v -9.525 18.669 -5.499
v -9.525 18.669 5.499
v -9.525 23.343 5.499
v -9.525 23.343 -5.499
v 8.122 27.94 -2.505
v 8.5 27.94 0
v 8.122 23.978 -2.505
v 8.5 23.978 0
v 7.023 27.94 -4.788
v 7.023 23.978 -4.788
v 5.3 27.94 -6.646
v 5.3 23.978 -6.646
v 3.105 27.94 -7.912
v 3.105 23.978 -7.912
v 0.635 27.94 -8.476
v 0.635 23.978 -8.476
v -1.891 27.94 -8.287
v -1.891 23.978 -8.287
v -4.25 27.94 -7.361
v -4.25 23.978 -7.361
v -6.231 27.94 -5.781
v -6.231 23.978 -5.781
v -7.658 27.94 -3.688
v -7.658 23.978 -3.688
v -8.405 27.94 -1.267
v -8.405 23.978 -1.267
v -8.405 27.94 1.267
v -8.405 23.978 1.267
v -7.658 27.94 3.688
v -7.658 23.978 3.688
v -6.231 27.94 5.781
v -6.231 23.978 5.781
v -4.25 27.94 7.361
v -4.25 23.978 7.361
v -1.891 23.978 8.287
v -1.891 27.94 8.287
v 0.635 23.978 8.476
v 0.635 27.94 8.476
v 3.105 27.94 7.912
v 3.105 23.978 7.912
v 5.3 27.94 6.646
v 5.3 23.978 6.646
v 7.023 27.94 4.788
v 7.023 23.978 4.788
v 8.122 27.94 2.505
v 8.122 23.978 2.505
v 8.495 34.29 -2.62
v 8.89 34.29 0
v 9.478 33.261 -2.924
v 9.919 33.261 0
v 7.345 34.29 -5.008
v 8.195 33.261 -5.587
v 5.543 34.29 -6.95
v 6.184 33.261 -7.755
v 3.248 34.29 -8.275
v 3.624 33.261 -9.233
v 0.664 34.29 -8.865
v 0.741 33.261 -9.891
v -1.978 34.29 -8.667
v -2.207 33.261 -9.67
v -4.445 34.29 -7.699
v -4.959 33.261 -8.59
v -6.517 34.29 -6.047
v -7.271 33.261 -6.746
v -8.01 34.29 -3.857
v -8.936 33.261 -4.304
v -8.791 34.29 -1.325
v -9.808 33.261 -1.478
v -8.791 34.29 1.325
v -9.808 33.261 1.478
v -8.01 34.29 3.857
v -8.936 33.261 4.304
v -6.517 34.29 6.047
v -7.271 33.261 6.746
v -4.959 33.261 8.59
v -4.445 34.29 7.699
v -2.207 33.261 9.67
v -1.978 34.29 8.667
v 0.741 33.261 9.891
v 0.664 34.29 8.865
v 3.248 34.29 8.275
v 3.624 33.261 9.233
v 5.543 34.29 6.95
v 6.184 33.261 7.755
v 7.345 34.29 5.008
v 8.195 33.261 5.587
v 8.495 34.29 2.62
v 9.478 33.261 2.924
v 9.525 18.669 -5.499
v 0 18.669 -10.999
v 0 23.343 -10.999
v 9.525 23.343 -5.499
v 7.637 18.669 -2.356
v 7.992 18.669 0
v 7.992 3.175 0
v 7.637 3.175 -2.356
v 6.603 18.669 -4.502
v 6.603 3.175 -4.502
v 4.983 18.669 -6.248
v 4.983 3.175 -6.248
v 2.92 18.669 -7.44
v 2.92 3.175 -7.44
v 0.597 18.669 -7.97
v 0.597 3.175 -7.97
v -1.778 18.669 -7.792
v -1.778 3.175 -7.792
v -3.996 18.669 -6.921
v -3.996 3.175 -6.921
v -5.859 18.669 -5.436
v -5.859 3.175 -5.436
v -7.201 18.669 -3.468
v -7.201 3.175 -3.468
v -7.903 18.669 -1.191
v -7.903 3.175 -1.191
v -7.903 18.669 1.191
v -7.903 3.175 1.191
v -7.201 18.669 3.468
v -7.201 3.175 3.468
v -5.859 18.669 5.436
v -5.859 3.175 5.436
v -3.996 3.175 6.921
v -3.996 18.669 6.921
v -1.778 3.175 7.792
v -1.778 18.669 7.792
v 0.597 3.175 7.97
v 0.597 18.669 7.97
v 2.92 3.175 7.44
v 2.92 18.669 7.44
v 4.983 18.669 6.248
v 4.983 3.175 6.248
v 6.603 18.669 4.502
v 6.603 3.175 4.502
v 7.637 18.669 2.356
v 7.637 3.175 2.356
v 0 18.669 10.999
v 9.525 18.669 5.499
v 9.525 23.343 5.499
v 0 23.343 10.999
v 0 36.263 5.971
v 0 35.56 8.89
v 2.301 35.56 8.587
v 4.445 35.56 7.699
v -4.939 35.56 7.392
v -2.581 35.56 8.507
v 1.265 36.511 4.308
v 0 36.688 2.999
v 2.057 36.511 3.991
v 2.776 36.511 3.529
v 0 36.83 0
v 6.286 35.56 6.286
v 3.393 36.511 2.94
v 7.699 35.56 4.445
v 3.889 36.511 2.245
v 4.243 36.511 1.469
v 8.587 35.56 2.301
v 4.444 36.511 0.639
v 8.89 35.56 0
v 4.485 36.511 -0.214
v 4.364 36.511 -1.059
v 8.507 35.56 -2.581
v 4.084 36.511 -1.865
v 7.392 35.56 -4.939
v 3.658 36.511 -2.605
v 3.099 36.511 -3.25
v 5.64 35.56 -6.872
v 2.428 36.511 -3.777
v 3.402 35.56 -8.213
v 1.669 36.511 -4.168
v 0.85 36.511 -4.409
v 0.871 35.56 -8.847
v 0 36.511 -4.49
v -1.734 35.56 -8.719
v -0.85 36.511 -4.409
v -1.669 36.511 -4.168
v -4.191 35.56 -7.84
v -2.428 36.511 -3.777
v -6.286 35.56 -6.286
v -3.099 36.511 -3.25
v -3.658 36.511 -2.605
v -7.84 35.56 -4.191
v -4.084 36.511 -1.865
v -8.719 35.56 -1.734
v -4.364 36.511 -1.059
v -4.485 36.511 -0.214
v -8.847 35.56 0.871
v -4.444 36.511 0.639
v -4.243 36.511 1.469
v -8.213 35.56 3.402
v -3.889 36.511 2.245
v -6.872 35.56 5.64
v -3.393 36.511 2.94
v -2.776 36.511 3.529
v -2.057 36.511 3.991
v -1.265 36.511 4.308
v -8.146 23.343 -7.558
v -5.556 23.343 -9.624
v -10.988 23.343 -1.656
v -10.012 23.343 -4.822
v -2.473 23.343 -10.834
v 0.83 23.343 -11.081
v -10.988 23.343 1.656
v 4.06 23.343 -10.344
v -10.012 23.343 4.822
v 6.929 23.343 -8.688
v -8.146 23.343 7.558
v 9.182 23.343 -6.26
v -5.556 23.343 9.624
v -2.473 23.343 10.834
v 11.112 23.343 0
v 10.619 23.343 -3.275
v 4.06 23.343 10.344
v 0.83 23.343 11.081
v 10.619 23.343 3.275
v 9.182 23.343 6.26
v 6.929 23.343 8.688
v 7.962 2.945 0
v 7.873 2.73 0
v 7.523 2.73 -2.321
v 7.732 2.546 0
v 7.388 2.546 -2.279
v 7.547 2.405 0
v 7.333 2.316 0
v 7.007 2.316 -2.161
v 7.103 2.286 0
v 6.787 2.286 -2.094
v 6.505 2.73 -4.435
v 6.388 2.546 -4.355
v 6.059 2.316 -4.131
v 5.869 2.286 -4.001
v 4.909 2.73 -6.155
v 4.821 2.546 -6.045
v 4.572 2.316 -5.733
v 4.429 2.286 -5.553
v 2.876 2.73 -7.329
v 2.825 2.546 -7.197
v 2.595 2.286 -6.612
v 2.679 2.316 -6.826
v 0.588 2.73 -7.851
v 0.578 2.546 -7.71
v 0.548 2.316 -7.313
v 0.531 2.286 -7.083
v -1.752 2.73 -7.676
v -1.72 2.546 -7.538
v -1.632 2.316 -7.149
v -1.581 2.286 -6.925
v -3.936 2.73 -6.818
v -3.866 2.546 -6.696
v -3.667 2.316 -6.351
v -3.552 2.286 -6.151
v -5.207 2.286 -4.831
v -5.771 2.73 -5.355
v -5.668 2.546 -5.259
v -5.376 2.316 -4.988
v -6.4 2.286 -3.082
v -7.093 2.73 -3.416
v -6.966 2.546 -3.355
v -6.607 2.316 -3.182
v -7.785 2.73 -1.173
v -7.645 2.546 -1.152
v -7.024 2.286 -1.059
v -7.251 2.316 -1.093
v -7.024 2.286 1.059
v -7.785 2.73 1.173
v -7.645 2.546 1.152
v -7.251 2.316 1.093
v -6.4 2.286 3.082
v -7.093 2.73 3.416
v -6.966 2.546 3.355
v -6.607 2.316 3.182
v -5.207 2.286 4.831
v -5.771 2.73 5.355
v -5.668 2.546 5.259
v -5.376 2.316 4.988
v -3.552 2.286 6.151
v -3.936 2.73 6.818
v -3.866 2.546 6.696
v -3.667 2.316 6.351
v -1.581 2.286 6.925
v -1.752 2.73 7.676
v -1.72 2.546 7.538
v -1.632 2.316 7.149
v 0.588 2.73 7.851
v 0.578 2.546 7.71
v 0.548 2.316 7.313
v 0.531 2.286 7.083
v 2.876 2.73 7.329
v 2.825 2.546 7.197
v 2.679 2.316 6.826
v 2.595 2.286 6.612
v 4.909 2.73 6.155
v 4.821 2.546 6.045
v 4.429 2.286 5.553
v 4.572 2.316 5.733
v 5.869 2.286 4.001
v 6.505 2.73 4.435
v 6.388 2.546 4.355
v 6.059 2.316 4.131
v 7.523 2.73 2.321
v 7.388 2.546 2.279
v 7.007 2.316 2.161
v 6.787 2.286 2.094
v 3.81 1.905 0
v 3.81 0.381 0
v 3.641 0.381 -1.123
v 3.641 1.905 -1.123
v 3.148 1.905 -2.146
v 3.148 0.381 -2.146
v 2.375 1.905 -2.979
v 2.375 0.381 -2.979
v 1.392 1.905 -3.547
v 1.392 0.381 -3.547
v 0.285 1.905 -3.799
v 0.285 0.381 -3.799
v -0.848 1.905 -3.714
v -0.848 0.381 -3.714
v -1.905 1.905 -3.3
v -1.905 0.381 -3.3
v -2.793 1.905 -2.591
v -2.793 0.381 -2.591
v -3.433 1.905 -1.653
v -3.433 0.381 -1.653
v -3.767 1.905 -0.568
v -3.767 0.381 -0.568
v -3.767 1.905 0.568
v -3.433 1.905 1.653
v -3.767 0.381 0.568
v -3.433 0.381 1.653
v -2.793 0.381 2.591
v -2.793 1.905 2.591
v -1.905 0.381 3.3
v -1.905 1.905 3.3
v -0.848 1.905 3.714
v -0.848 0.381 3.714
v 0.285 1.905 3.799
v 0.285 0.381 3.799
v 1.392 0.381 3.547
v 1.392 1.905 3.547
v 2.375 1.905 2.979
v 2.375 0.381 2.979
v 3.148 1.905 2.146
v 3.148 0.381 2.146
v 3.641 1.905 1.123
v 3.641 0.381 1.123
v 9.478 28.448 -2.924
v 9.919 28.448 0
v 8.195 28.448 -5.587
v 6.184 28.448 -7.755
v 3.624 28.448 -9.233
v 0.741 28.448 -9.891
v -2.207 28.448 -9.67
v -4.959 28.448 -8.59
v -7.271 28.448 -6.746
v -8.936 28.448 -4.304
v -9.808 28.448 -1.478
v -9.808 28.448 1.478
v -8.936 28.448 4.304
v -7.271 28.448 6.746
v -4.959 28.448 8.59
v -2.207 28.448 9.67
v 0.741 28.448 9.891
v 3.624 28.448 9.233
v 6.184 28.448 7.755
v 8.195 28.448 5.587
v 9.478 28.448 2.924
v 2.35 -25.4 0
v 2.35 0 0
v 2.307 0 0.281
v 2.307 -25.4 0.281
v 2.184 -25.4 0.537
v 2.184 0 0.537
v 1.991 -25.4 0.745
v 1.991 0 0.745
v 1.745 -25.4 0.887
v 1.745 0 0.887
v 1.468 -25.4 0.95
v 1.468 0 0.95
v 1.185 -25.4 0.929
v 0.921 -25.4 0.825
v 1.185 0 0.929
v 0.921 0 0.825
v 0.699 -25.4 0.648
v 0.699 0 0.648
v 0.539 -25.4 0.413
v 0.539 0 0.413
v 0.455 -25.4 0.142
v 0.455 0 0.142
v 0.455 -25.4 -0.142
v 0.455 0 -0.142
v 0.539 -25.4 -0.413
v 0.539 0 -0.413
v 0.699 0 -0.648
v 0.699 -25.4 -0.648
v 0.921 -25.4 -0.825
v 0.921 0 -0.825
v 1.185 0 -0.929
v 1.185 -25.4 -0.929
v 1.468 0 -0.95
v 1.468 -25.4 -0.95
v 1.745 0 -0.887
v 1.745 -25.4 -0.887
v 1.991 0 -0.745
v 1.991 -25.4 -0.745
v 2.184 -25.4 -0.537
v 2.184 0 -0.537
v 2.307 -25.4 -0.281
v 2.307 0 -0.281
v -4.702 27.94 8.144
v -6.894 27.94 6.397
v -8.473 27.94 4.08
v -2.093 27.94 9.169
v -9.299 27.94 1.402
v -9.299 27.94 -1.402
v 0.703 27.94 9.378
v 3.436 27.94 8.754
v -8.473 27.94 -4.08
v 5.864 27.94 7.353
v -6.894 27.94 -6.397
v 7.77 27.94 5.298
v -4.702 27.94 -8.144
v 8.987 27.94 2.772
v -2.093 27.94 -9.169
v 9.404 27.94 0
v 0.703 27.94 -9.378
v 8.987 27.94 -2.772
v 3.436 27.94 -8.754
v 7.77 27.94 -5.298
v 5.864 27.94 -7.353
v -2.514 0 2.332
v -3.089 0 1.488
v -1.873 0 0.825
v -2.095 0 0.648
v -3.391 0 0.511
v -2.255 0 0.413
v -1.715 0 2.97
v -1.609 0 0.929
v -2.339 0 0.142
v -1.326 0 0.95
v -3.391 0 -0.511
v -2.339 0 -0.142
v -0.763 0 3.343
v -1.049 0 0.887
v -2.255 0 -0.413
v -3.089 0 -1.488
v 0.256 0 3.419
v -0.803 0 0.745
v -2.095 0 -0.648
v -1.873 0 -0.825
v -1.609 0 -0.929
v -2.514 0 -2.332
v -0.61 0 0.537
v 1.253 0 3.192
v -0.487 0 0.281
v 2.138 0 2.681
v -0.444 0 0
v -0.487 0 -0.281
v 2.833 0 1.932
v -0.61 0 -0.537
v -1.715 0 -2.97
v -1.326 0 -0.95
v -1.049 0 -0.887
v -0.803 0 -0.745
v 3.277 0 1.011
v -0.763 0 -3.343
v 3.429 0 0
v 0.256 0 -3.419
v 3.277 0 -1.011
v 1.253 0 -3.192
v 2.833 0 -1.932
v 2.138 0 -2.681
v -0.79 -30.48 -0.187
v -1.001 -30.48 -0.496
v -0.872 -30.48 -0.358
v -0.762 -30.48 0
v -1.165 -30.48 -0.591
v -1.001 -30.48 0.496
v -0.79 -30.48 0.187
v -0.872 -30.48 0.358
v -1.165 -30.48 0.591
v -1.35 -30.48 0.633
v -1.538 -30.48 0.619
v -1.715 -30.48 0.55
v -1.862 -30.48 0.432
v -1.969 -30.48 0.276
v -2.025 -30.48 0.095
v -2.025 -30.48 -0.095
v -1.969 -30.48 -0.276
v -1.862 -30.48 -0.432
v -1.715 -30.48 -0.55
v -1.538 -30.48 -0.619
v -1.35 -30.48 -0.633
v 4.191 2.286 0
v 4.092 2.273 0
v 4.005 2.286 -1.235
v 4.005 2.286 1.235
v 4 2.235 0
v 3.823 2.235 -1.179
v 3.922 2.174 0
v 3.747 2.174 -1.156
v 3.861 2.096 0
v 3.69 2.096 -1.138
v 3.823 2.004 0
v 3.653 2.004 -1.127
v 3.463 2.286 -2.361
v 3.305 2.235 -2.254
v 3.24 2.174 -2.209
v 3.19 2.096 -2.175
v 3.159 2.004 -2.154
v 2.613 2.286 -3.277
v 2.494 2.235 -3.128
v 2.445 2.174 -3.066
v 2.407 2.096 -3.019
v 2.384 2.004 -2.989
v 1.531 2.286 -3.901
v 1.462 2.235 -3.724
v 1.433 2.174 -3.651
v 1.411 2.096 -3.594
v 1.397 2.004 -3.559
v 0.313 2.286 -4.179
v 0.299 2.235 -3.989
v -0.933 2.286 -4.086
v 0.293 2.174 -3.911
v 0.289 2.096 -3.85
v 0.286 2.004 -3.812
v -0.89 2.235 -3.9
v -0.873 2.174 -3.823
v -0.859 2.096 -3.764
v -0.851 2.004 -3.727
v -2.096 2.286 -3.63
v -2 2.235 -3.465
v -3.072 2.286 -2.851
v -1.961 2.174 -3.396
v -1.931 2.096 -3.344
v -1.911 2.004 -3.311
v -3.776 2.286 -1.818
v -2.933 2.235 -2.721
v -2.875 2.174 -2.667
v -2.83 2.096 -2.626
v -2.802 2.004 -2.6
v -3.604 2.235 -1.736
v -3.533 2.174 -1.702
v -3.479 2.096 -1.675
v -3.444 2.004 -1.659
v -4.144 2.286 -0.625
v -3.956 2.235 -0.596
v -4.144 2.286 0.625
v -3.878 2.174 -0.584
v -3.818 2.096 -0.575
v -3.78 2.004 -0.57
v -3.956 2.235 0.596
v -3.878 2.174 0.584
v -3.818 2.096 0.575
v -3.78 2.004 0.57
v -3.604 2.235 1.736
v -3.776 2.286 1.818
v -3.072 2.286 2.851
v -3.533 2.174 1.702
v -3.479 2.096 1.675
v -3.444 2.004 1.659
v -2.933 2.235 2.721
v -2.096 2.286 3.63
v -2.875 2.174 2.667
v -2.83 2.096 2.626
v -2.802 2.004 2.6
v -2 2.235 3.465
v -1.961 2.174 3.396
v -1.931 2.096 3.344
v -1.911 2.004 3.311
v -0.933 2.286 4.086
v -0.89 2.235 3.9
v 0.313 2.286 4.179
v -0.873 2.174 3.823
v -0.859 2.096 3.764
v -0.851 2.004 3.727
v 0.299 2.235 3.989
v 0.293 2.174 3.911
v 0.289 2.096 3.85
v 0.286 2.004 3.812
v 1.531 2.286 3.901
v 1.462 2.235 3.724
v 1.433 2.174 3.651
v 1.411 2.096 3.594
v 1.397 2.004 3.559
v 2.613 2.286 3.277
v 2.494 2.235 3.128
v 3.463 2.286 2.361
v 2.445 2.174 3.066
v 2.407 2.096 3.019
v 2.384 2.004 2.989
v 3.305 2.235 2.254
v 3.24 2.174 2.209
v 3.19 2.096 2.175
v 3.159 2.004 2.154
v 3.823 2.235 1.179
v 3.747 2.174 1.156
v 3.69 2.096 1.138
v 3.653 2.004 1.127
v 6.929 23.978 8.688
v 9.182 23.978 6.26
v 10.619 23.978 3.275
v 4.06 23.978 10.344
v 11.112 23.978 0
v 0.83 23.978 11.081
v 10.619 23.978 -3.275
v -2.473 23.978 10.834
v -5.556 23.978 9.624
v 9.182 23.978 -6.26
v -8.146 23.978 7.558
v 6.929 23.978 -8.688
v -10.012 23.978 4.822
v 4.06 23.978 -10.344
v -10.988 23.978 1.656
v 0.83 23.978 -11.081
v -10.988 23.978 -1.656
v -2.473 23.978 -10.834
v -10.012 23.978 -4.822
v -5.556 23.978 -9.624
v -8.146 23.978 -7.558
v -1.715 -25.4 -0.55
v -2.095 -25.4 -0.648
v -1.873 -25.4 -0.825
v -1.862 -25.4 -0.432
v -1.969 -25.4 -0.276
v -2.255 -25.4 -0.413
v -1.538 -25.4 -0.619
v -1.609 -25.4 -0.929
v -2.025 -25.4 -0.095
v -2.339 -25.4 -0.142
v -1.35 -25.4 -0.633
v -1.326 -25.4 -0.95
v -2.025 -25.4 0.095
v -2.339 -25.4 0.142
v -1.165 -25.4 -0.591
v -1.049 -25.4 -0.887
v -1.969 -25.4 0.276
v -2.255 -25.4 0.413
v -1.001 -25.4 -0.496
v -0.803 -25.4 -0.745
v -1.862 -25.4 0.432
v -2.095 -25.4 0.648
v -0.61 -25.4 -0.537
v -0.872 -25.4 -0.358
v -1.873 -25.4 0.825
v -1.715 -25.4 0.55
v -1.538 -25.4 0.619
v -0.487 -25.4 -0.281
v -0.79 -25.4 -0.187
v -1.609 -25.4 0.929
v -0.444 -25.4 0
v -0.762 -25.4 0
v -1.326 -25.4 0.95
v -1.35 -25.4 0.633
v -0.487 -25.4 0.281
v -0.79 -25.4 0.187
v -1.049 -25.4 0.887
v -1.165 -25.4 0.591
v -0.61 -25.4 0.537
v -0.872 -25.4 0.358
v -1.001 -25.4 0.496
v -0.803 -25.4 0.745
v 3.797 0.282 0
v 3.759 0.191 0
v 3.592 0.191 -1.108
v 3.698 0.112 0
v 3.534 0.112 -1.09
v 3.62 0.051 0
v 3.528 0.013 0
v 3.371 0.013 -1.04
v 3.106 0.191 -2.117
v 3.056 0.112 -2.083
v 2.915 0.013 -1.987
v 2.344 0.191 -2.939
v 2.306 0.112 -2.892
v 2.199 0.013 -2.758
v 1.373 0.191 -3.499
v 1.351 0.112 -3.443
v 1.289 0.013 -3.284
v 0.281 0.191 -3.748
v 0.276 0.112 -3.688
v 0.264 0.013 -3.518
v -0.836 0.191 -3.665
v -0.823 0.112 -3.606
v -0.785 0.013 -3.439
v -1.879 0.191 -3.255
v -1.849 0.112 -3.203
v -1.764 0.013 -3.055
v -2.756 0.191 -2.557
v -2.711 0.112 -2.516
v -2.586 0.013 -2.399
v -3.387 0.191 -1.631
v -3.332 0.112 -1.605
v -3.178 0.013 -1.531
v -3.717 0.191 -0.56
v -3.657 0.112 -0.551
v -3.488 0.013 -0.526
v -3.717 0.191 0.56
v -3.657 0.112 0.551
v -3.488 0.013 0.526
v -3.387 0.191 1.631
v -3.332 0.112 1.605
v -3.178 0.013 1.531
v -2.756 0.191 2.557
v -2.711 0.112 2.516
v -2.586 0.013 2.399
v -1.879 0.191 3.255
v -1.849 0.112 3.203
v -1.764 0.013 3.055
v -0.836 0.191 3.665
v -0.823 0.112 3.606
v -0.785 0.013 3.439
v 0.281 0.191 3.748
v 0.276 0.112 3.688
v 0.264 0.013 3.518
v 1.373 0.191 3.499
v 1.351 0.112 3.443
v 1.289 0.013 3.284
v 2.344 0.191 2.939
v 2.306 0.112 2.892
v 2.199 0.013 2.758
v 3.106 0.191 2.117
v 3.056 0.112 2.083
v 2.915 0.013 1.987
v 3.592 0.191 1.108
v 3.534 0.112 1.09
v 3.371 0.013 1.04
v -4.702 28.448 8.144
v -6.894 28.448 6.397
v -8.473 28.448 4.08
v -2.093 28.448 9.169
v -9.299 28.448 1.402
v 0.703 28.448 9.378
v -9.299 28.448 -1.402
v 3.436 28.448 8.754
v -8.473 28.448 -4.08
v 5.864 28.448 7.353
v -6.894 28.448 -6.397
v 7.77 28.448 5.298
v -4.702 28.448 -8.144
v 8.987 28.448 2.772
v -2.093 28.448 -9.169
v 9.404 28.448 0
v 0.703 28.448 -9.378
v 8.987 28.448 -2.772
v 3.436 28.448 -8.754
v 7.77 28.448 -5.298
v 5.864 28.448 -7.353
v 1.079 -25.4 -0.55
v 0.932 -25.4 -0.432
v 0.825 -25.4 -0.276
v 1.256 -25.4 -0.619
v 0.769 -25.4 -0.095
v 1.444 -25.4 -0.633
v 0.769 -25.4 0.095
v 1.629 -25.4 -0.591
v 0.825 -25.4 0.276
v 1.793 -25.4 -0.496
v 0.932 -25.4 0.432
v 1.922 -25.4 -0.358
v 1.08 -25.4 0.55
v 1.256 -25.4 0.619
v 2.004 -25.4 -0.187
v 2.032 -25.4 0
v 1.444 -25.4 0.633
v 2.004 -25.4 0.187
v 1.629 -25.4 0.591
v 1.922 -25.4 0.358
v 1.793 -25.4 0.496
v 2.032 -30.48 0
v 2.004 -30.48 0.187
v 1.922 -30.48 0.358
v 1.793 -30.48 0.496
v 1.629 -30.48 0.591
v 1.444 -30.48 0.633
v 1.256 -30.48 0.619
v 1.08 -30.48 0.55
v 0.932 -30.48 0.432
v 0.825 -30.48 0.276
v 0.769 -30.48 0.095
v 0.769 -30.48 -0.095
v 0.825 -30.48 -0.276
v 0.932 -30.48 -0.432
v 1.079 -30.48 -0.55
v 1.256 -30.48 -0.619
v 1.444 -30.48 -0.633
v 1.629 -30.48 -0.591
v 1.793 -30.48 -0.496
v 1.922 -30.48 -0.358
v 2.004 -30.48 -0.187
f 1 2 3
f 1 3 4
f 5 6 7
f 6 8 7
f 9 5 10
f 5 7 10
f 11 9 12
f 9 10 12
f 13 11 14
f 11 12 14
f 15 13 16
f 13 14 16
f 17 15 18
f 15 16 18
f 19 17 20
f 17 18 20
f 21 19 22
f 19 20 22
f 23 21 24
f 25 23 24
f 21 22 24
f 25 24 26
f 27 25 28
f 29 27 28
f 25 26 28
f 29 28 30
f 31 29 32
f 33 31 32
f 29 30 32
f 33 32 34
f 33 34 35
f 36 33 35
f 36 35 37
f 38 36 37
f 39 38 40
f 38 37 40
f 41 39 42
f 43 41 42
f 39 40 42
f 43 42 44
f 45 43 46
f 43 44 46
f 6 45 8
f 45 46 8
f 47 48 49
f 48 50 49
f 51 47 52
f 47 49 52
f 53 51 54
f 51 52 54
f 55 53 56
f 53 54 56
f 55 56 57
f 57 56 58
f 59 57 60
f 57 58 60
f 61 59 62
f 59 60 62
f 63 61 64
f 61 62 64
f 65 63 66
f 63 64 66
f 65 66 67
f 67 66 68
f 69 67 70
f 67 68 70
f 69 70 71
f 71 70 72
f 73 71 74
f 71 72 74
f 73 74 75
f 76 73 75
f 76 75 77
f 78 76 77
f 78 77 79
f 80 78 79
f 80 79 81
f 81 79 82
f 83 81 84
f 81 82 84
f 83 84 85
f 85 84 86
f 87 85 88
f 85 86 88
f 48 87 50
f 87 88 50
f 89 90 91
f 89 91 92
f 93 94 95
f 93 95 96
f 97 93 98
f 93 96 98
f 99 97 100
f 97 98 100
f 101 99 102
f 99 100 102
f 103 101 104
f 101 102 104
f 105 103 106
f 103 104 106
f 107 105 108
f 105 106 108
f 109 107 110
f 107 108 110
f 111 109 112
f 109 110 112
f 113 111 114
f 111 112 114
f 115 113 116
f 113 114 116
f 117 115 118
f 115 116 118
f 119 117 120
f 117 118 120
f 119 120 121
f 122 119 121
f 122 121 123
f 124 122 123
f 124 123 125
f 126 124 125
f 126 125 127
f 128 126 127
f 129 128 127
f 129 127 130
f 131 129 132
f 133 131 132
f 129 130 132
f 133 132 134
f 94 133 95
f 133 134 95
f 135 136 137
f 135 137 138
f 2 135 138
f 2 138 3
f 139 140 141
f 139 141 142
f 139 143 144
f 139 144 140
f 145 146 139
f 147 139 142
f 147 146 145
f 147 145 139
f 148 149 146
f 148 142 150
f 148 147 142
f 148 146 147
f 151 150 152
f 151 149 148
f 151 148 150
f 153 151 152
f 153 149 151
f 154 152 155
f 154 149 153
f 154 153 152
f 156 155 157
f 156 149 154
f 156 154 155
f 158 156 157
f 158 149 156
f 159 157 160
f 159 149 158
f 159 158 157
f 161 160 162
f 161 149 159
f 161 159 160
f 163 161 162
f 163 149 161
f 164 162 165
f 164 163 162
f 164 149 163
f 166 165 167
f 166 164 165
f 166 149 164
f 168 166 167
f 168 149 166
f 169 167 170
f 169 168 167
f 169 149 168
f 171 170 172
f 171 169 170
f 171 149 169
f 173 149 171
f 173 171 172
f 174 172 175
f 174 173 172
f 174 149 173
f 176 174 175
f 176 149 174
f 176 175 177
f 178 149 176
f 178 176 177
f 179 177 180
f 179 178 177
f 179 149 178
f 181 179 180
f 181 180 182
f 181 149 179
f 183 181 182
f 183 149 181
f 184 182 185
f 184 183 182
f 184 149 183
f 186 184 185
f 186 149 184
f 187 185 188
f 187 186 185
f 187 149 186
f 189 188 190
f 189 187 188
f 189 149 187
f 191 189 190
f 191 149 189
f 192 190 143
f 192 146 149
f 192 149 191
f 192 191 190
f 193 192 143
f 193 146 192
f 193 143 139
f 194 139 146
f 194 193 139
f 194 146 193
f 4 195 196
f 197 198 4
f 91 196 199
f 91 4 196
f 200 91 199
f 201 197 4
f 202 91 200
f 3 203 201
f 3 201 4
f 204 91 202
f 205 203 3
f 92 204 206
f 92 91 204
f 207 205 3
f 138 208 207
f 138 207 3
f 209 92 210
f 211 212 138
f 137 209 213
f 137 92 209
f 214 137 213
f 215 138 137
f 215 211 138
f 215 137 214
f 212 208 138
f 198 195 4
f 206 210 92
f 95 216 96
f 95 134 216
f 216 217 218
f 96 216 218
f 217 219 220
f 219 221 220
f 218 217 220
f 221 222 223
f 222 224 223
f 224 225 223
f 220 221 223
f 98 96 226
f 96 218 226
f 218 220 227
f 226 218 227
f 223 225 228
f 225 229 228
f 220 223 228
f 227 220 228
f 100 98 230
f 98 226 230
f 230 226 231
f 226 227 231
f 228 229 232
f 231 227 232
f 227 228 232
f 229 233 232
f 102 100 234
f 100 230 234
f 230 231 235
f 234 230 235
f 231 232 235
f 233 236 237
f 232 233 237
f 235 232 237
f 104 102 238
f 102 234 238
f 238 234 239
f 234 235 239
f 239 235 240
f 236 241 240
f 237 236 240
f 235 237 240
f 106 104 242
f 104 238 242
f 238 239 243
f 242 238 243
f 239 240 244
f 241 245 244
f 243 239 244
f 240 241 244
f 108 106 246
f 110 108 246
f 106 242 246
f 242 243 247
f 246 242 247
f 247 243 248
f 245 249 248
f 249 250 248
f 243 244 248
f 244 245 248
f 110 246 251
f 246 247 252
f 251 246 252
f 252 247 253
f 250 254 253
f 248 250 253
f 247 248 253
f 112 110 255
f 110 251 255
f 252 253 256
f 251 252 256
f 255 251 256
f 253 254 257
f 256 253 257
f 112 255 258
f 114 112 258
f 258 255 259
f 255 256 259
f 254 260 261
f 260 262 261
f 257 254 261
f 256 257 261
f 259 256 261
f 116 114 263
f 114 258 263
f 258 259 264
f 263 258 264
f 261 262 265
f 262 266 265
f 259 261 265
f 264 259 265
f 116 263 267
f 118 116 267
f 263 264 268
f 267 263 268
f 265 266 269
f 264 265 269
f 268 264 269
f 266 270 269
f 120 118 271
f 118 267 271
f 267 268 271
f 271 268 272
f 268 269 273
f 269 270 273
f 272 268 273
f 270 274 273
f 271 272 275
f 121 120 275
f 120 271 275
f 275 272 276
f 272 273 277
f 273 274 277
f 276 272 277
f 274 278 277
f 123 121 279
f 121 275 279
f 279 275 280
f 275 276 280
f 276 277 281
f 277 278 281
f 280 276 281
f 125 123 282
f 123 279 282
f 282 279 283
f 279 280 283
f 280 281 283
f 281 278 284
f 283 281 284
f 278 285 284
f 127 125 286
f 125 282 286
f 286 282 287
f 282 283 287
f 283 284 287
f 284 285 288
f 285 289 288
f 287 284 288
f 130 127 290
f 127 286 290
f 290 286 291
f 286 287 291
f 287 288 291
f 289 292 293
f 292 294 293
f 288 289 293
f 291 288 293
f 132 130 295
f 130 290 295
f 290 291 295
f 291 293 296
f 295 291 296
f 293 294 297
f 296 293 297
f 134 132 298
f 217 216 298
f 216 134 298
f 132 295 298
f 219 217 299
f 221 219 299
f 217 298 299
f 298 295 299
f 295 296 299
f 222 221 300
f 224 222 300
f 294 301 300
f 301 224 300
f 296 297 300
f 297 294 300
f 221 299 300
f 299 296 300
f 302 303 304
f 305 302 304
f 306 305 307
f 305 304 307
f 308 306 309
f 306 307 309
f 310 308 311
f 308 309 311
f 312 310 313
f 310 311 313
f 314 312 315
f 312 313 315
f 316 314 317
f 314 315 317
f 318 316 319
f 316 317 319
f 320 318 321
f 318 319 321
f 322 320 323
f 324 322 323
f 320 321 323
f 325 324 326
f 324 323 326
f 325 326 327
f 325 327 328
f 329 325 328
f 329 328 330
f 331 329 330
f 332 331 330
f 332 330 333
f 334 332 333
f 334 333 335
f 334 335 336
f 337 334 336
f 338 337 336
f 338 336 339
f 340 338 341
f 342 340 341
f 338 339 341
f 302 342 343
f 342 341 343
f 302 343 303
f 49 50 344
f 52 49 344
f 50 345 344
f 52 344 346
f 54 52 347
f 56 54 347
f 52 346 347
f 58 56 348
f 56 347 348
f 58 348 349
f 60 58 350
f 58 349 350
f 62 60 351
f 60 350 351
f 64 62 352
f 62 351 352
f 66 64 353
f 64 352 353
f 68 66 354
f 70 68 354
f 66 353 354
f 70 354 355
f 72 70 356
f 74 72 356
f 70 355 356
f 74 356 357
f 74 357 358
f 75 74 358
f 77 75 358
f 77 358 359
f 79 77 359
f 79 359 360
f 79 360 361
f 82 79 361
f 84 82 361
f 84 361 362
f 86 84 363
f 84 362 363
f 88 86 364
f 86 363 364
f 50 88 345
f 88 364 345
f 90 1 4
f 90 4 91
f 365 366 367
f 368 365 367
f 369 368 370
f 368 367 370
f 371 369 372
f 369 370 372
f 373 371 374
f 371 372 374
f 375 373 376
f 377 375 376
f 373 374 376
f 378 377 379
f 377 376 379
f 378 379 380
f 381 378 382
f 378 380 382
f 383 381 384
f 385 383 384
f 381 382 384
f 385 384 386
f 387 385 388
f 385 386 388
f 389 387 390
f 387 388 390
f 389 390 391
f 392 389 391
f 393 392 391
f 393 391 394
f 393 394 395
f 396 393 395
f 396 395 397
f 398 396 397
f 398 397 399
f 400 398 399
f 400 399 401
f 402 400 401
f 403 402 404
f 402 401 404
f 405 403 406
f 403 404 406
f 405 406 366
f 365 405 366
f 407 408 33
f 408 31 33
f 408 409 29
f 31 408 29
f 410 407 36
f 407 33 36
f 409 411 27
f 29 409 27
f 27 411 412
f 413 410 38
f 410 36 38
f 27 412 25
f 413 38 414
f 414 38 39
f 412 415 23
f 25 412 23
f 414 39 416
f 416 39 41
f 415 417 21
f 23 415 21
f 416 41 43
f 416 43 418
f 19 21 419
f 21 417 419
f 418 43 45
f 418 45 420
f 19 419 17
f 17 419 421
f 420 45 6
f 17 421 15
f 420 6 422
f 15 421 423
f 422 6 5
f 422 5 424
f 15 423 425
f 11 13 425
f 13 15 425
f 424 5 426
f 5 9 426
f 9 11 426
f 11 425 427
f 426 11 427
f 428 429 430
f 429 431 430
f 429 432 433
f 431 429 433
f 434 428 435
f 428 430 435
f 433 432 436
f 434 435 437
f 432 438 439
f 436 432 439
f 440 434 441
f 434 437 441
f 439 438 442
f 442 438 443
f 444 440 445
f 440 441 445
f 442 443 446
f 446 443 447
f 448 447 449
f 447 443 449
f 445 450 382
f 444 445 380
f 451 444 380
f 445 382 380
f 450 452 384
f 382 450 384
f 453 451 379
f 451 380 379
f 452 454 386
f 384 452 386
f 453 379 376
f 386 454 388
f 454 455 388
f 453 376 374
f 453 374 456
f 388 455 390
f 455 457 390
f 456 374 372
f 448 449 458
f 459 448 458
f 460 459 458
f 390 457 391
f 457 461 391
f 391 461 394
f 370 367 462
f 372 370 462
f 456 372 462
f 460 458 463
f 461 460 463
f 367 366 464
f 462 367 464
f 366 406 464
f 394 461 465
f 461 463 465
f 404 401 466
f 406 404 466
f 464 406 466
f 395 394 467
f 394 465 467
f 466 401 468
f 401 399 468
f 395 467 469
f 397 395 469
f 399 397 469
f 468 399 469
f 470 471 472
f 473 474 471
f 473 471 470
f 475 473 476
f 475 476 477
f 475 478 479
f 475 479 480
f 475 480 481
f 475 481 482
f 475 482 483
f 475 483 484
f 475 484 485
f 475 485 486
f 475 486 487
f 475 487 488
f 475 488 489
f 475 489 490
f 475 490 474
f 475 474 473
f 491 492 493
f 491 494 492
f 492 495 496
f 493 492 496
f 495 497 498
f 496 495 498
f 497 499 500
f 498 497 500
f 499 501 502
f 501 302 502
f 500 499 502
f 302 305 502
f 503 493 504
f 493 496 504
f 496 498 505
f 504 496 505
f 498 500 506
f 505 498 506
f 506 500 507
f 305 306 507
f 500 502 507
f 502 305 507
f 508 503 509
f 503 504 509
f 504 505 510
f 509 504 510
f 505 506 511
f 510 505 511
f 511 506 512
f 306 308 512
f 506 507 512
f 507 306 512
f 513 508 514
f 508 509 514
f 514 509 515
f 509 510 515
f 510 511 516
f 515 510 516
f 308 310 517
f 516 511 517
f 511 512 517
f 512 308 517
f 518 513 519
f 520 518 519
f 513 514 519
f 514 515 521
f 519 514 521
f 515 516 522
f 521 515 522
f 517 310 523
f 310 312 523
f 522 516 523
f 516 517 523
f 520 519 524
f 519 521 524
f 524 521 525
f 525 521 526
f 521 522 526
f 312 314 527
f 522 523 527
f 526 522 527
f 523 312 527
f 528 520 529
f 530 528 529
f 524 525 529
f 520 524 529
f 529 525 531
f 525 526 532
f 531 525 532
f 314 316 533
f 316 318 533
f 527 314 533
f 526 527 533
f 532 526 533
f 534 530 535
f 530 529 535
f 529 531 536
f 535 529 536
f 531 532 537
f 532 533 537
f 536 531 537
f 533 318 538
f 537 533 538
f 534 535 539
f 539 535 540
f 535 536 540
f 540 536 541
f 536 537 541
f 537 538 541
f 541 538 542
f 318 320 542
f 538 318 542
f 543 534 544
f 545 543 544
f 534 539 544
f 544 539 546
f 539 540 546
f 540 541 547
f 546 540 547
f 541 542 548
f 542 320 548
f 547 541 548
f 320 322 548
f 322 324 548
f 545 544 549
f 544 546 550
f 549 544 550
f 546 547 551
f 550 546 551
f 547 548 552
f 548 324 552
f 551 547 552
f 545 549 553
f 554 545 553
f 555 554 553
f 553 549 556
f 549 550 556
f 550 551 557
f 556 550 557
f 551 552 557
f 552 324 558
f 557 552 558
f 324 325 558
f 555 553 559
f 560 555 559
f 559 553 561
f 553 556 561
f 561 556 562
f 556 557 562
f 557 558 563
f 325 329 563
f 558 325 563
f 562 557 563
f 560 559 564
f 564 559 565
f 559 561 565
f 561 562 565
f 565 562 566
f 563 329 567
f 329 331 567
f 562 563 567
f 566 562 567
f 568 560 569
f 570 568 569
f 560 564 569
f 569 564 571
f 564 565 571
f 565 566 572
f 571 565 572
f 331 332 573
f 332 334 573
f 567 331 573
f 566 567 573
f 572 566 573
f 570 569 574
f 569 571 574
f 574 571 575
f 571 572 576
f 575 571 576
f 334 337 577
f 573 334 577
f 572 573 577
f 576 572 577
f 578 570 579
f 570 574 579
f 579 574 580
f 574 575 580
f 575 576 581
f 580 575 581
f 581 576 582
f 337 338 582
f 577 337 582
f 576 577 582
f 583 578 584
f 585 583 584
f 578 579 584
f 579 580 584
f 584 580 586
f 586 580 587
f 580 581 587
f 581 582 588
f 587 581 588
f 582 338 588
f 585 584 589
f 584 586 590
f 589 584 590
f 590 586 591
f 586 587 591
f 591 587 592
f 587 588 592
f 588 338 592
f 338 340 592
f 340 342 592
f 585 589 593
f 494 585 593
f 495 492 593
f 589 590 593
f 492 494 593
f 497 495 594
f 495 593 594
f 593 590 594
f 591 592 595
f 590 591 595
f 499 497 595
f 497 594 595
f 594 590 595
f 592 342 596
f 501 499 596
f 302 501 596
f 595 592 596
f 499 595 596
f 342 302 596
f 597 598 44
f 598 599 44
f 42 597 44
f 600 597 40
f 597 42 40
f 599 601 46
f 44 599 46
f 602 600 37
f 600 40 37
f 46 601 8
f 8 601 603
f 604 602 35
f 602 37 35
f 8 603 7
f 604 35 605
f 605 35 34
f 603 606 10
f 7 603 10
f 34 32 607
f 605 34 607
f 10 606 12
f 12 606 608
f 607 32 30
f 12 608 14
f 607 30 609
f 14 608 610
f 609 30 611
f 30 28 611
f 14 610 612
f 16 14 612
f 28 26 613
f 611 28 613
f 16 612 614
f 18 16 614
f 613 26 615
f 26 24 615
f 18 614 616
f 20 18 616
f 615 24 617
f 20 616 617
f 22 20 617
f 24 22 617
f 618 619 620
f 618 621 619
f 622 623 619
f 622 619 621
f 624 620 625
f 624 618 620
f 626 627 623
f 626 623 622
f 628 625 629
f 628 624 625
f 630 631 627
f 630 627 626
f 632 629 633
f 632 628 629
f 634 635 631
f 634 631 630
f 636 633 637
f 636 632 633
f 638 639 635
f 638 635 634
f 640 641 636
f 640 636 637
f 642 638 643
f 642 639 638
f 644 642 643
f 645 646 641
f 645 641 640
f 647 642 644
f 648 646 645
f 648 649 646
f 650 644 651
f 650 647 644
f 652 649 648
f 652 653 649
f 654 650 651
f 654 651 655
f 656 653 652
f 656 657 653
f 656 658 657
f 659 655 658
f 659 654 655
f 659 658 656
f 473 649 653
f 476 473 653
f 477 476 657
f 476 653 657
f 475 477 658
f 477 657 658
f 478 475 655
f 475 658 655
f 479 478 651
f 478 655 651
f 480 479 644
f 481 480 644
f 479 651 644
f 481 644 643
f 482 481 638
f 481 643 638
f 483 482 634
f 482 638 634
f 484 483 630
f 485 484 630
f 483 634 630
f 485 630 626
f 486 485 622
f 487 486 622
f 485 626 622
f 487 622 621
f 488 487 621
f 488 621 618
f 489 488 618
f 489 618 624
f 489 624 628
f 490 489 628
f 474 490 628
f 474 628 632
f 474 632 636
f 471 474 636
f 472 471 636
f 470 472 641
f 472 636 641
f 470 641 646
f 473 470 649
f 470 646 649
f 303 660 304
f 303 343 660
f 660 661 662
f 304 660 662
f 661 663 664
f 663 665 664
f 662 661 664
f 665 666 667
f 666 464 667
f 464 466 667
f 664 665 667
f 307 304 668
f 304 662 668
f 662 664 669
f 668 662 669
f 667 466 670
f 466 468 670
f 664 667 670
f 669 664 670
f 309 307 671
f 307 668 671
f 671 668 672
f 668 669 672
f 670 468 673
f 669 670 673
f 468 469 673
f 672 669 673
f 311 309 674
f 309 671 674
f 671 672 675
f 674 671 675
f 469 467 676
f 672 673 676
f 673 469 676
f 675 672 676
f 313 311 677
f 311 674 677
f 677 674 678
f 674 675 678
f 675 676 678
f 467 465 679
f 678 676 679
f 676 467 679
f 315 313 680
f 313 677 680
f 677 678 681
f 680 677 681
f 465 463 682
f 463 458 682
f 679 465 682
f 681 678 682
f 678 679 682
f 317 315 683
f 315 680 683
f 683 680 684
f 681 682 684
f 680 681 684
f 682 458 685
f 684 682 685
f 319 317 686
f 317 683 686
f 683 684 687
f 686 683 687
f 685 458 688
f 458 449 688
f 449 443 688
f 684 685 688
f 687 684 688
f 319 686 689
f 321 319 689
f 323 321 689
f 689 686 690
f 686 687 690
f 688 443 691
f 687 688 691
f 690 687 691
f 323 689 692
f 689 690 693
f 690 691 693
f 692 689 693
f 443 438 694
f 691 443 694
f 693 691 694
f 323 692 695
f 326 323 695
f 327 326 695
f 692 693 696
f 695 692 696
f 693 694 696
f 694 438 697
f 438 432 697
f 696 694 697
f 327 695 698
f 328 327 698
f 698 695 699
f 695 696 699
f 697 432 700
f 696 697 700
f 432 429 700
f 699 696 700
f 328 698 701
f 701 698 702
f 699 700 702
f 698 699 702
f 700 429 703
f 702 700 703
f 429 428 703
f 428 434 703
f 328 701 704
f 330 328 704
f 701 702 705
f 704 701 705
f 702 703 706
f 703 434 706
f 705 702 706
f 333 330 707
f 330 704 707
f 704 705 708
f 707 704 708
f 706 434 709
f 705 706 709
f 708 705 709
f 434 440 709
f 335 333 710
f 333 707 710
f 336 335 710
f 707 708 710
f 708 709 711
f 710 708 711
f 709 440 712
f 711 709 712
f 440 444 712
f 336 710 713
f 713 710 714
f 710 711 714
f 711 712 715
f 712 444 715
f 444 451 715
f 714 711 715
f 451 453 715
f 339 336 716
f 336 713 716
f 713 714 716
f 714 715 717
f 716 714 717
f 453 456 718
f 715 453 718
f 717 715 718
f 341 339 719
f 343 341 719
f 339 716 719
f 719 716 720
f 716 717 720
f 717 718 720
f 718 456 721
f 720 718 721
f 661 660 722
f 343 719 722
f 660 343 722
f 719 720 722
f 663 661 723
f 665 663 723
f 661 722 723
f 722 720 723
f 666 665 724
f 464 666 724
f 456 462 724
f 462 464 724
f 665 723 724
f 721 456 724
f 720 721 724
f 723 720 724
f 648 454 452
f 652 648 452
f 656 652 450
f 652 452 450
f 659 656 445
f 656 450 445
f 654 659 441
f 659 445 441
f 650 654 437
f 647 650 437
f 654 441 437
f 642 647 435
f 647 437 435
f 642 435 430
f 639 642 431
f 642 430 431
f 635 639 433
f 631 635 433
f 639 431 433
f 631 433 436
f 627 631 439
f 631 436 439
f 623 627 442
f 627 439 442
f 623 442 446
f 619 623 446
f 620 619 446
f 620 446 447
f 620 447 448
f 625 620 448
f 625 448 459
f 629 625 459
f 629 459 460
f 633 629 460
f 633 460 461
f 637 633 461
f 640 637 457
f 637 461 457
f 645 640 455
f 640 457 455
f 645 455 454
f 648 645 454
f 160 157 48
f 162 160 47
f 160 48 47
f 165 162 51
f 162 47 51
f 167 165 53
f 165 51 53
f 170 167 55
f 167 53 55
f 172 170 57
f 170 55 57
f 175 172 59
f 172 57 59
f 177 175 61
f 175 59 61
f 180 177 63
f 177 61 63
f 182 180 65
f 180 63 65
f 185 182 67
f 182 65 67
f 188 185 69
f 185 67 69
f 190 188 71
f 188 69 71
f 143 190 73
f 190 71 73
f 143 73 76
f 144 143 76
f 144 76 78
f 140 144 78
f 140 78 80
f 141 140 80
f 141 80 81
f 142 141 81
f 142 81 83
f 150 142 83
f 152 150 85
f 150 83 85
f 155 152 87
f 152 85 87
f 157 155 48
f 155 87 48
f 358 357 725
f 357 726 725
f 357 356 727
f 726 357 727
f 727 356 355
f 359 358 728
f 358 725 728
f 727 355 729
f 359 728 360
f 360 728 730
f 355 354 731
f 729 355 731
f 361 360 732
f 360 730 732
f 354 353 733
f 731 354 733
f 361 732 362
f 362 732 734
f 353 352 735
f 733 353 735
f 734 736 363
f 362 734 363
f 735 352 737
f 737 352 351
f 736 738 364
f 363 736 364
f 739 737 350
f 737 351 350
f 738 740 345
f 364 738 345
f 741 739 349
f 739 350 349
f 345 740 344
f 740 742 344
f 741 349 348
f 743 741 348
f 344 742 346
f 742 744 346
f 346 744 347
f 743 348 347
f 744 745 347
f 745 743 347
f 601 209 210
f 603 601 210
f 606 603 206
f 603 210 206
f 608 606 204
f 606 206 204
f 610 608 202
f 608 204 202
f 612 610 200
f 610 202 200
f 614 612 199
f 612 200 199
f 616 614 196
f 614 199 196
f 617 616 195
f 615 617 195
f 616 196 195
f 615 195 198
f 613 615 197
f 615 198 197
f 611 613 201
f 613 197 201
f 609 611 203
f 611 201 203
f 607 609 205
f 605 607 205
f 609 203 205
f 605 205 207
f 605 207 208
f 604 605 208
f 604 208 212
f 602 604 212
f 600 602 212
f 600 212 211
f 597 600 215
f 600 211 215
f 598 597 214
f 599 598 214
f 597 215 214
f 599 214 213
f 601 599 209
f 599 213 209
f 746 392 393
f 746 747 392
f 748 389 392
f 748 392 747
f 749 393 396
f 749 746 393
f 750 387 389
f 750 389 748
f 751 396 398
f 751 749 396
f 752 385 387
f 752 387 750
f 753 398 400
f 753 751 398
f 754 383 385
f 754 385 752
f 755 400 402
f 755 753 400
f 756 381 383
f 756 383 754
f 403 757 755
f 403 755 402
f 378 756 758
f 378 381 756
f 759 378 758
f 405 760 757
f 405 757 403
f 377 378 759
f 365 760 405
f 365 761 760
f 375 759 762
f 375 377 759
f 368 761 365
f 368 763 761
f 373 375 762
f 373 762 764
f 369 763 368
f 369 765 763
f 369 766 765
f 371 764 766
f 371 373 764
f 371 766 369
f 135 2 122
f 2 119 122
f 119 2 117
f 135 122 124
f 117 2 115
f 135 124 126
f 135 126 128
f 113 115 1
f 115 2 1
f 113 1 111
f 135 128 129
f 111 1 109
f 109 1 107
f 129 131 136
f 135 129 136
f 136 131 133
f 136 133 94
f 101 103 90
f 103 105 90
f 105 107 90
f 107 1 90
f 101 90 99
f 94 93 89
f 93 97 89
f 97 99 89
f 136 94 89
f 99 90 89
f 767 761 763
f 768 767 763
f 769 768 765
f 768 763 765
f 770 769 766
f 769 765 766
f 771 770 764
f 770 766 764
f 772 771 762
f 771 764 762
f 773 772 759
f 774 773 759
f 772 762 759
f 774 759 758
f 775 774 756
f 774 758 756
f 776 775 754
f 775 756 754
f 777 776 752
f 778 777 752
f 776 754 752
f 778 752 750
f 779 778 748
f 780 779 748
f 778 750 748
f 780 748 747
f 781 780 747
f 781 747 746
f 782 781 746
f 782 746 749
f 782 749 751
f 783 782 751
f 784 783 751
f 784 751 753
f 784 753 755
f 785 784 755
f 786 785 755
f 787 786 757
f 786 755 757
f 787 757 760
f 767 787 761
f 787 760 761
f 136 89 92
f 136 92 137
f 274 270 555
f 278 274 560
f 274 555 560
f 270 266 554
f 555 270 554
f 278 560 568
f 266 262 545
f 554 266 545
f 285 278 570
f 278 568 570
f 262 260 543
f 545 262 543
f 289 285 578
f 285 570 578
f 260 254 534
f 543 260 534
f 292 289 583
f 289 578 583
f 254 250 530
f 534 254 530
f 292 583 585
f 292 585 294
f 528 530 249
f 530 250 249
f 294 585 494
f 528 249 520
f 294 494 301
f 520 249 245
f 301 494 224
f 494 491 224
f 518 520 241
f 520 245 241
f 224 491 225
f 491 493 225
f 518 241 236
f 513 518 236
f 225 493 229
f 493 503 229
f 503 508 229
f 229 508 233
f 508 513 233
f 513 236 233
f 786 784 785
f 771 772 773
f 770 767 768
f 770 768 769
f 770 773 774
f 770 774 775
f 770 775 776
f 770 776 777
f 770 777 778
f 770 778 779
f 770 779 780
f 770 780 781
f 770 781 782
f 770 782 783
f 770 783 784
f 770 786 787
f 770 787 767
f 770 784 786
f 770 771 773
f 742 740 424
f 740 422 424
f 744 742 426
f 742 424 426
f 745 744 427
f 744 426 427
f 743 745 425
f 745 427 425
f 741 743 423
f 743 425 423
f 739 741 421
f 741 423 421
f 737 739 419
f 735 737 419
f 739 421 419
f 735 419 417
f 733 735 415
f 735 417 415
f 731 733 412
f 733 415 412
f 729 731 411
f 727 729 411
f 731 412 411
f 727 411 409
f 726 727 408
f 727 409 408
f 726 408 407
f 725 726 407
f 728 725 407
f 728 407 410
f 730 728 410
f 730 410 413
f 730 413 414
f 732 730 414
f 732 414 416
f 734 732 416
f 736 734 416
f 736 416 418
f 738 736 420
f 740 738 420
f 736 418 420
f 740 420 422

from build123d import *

# Parameters (mm, degrees)
DOME1_FACE_RADIUS   = 8.89
DOME1_HEIGHT        = 1.27
SKETCH2_OUTSIDE_W   = 33.908
SKETCH2_OUTSIDE_H   = 33.908
CUT_EXTRUDE1_DEPTH  = 4.6736
SKETCH3_R           = 0.9525
BOSS_EXTRUDE1_DEPTH = 25.4
SKETCH4_R           = 0.635
BOSS_EXTRUDE2_DEPTH = 5.08
FILLET1_R           = 0.889
FILLET2_R           = 0.381


with BuildPart() as part:
    # Sketch1 → Revolve1 (revolve)
    with BuildSketch(Plane.XY):
        Polygon((0, 35.56), (8.89, 35.56), (8.89, 34.29), (9.9187, 33.2613), (9.9187, 28.448), (9.40435, 28.448), (9.40435, 27.94), (8.5, 27.94), (8.5, 23.9776), (11.1125, 23.9776), (11.1125, 18.669), (7.992, 18.669), (7.992, 2.286), (3.81, 2.286), (3.81, 0), (0, 0), align=None)
    revolve(axis=Axis((0, 0, 0), (0, 1, 0)))

    # Dome1: a dome of height H over a round flat face of radius A is a cap of a sphere of radius (A * A + H * H) / (2 * H)
    dome1_r = (DOME1_FACE_RADIUS * DOME1_FACE_RADIUS + DOME1_HEIGHT * DOME1_HEIGHT) / (2 * DOME1_HEIGHT)
    dome1_base = Plane((0, 35.56, 0), z_dir=(0, 1, 0))
    with Locations(dome1_base.offset(DOME1_HEIGHT - dome1_r)):
        dome1_ball = Sphere(dome1_r, mode=Mode.PRIVATE)
    add(split(dome1_ball, bisect_by=dome1_base, keep=Keep.TOP, mode=Mode.PRIVATE))

    # Sketch2 outside → Cut-Extrude1 (cut)
    with BuildSketch(Plane.XZ.offset(-18.669)):
        Rectangle(SKETCH2_OUTSIDE_W, SKETCH2_OUTSIDE_H)
        Polygon((0, 10.998522628), (-9.525, 5.499261314), (-9.525, -5.499261314), (0, -10.998522628), (9.525, -5.499261314), (9.525, 5.499261314), align=None, mode=Mode.SUBTRACT)
    extrude(amount=-CUT_EXTRUDE1_DEPTH, mode=Mode.SUBTRACT)

    # Sketch3 → Boss-Extrude1 (add)
    with BuildSketch(Plane.XZ):
        with Locations((-1.397, 0)):
            Circle(SKETCH3_R)
        with Locations((1.397, 0)):
            Circle(SKETCH3_R)
    extrude(amount=BOSS_EXTRUDE1_DEPTH)

    # Sketch4 → Boss-Extrude2 (add)
    with BuildSketch(Plane.XZ.offset(25.4)):
        with Locations((1.397, 0)):
            Circle(SKETCH4_R)
        with Locations((-1.397, 0)):
            Circle(SKETCH4_R)
    extrude(amount=BOSS_EXTRUDE2_DEPTH)

    # Fillet1
    fillet1_edges = [part.edges().sort_by_distance(p)[0] for p in [
        (-7.992, 2.286, 0),
    ]]
    fillet(fillet1_edges, radius=FILLET1_R)

    # Fillet2
    fillet2_edges = [part.edges().sort_by_distance(p)[0] for p in [
        (-3.81, 0, 0),
        (-3.81, 2.286, 0),
    ]]
    fillet(fillet2_edges, radius=FILLET2_R)


solid = part.part
